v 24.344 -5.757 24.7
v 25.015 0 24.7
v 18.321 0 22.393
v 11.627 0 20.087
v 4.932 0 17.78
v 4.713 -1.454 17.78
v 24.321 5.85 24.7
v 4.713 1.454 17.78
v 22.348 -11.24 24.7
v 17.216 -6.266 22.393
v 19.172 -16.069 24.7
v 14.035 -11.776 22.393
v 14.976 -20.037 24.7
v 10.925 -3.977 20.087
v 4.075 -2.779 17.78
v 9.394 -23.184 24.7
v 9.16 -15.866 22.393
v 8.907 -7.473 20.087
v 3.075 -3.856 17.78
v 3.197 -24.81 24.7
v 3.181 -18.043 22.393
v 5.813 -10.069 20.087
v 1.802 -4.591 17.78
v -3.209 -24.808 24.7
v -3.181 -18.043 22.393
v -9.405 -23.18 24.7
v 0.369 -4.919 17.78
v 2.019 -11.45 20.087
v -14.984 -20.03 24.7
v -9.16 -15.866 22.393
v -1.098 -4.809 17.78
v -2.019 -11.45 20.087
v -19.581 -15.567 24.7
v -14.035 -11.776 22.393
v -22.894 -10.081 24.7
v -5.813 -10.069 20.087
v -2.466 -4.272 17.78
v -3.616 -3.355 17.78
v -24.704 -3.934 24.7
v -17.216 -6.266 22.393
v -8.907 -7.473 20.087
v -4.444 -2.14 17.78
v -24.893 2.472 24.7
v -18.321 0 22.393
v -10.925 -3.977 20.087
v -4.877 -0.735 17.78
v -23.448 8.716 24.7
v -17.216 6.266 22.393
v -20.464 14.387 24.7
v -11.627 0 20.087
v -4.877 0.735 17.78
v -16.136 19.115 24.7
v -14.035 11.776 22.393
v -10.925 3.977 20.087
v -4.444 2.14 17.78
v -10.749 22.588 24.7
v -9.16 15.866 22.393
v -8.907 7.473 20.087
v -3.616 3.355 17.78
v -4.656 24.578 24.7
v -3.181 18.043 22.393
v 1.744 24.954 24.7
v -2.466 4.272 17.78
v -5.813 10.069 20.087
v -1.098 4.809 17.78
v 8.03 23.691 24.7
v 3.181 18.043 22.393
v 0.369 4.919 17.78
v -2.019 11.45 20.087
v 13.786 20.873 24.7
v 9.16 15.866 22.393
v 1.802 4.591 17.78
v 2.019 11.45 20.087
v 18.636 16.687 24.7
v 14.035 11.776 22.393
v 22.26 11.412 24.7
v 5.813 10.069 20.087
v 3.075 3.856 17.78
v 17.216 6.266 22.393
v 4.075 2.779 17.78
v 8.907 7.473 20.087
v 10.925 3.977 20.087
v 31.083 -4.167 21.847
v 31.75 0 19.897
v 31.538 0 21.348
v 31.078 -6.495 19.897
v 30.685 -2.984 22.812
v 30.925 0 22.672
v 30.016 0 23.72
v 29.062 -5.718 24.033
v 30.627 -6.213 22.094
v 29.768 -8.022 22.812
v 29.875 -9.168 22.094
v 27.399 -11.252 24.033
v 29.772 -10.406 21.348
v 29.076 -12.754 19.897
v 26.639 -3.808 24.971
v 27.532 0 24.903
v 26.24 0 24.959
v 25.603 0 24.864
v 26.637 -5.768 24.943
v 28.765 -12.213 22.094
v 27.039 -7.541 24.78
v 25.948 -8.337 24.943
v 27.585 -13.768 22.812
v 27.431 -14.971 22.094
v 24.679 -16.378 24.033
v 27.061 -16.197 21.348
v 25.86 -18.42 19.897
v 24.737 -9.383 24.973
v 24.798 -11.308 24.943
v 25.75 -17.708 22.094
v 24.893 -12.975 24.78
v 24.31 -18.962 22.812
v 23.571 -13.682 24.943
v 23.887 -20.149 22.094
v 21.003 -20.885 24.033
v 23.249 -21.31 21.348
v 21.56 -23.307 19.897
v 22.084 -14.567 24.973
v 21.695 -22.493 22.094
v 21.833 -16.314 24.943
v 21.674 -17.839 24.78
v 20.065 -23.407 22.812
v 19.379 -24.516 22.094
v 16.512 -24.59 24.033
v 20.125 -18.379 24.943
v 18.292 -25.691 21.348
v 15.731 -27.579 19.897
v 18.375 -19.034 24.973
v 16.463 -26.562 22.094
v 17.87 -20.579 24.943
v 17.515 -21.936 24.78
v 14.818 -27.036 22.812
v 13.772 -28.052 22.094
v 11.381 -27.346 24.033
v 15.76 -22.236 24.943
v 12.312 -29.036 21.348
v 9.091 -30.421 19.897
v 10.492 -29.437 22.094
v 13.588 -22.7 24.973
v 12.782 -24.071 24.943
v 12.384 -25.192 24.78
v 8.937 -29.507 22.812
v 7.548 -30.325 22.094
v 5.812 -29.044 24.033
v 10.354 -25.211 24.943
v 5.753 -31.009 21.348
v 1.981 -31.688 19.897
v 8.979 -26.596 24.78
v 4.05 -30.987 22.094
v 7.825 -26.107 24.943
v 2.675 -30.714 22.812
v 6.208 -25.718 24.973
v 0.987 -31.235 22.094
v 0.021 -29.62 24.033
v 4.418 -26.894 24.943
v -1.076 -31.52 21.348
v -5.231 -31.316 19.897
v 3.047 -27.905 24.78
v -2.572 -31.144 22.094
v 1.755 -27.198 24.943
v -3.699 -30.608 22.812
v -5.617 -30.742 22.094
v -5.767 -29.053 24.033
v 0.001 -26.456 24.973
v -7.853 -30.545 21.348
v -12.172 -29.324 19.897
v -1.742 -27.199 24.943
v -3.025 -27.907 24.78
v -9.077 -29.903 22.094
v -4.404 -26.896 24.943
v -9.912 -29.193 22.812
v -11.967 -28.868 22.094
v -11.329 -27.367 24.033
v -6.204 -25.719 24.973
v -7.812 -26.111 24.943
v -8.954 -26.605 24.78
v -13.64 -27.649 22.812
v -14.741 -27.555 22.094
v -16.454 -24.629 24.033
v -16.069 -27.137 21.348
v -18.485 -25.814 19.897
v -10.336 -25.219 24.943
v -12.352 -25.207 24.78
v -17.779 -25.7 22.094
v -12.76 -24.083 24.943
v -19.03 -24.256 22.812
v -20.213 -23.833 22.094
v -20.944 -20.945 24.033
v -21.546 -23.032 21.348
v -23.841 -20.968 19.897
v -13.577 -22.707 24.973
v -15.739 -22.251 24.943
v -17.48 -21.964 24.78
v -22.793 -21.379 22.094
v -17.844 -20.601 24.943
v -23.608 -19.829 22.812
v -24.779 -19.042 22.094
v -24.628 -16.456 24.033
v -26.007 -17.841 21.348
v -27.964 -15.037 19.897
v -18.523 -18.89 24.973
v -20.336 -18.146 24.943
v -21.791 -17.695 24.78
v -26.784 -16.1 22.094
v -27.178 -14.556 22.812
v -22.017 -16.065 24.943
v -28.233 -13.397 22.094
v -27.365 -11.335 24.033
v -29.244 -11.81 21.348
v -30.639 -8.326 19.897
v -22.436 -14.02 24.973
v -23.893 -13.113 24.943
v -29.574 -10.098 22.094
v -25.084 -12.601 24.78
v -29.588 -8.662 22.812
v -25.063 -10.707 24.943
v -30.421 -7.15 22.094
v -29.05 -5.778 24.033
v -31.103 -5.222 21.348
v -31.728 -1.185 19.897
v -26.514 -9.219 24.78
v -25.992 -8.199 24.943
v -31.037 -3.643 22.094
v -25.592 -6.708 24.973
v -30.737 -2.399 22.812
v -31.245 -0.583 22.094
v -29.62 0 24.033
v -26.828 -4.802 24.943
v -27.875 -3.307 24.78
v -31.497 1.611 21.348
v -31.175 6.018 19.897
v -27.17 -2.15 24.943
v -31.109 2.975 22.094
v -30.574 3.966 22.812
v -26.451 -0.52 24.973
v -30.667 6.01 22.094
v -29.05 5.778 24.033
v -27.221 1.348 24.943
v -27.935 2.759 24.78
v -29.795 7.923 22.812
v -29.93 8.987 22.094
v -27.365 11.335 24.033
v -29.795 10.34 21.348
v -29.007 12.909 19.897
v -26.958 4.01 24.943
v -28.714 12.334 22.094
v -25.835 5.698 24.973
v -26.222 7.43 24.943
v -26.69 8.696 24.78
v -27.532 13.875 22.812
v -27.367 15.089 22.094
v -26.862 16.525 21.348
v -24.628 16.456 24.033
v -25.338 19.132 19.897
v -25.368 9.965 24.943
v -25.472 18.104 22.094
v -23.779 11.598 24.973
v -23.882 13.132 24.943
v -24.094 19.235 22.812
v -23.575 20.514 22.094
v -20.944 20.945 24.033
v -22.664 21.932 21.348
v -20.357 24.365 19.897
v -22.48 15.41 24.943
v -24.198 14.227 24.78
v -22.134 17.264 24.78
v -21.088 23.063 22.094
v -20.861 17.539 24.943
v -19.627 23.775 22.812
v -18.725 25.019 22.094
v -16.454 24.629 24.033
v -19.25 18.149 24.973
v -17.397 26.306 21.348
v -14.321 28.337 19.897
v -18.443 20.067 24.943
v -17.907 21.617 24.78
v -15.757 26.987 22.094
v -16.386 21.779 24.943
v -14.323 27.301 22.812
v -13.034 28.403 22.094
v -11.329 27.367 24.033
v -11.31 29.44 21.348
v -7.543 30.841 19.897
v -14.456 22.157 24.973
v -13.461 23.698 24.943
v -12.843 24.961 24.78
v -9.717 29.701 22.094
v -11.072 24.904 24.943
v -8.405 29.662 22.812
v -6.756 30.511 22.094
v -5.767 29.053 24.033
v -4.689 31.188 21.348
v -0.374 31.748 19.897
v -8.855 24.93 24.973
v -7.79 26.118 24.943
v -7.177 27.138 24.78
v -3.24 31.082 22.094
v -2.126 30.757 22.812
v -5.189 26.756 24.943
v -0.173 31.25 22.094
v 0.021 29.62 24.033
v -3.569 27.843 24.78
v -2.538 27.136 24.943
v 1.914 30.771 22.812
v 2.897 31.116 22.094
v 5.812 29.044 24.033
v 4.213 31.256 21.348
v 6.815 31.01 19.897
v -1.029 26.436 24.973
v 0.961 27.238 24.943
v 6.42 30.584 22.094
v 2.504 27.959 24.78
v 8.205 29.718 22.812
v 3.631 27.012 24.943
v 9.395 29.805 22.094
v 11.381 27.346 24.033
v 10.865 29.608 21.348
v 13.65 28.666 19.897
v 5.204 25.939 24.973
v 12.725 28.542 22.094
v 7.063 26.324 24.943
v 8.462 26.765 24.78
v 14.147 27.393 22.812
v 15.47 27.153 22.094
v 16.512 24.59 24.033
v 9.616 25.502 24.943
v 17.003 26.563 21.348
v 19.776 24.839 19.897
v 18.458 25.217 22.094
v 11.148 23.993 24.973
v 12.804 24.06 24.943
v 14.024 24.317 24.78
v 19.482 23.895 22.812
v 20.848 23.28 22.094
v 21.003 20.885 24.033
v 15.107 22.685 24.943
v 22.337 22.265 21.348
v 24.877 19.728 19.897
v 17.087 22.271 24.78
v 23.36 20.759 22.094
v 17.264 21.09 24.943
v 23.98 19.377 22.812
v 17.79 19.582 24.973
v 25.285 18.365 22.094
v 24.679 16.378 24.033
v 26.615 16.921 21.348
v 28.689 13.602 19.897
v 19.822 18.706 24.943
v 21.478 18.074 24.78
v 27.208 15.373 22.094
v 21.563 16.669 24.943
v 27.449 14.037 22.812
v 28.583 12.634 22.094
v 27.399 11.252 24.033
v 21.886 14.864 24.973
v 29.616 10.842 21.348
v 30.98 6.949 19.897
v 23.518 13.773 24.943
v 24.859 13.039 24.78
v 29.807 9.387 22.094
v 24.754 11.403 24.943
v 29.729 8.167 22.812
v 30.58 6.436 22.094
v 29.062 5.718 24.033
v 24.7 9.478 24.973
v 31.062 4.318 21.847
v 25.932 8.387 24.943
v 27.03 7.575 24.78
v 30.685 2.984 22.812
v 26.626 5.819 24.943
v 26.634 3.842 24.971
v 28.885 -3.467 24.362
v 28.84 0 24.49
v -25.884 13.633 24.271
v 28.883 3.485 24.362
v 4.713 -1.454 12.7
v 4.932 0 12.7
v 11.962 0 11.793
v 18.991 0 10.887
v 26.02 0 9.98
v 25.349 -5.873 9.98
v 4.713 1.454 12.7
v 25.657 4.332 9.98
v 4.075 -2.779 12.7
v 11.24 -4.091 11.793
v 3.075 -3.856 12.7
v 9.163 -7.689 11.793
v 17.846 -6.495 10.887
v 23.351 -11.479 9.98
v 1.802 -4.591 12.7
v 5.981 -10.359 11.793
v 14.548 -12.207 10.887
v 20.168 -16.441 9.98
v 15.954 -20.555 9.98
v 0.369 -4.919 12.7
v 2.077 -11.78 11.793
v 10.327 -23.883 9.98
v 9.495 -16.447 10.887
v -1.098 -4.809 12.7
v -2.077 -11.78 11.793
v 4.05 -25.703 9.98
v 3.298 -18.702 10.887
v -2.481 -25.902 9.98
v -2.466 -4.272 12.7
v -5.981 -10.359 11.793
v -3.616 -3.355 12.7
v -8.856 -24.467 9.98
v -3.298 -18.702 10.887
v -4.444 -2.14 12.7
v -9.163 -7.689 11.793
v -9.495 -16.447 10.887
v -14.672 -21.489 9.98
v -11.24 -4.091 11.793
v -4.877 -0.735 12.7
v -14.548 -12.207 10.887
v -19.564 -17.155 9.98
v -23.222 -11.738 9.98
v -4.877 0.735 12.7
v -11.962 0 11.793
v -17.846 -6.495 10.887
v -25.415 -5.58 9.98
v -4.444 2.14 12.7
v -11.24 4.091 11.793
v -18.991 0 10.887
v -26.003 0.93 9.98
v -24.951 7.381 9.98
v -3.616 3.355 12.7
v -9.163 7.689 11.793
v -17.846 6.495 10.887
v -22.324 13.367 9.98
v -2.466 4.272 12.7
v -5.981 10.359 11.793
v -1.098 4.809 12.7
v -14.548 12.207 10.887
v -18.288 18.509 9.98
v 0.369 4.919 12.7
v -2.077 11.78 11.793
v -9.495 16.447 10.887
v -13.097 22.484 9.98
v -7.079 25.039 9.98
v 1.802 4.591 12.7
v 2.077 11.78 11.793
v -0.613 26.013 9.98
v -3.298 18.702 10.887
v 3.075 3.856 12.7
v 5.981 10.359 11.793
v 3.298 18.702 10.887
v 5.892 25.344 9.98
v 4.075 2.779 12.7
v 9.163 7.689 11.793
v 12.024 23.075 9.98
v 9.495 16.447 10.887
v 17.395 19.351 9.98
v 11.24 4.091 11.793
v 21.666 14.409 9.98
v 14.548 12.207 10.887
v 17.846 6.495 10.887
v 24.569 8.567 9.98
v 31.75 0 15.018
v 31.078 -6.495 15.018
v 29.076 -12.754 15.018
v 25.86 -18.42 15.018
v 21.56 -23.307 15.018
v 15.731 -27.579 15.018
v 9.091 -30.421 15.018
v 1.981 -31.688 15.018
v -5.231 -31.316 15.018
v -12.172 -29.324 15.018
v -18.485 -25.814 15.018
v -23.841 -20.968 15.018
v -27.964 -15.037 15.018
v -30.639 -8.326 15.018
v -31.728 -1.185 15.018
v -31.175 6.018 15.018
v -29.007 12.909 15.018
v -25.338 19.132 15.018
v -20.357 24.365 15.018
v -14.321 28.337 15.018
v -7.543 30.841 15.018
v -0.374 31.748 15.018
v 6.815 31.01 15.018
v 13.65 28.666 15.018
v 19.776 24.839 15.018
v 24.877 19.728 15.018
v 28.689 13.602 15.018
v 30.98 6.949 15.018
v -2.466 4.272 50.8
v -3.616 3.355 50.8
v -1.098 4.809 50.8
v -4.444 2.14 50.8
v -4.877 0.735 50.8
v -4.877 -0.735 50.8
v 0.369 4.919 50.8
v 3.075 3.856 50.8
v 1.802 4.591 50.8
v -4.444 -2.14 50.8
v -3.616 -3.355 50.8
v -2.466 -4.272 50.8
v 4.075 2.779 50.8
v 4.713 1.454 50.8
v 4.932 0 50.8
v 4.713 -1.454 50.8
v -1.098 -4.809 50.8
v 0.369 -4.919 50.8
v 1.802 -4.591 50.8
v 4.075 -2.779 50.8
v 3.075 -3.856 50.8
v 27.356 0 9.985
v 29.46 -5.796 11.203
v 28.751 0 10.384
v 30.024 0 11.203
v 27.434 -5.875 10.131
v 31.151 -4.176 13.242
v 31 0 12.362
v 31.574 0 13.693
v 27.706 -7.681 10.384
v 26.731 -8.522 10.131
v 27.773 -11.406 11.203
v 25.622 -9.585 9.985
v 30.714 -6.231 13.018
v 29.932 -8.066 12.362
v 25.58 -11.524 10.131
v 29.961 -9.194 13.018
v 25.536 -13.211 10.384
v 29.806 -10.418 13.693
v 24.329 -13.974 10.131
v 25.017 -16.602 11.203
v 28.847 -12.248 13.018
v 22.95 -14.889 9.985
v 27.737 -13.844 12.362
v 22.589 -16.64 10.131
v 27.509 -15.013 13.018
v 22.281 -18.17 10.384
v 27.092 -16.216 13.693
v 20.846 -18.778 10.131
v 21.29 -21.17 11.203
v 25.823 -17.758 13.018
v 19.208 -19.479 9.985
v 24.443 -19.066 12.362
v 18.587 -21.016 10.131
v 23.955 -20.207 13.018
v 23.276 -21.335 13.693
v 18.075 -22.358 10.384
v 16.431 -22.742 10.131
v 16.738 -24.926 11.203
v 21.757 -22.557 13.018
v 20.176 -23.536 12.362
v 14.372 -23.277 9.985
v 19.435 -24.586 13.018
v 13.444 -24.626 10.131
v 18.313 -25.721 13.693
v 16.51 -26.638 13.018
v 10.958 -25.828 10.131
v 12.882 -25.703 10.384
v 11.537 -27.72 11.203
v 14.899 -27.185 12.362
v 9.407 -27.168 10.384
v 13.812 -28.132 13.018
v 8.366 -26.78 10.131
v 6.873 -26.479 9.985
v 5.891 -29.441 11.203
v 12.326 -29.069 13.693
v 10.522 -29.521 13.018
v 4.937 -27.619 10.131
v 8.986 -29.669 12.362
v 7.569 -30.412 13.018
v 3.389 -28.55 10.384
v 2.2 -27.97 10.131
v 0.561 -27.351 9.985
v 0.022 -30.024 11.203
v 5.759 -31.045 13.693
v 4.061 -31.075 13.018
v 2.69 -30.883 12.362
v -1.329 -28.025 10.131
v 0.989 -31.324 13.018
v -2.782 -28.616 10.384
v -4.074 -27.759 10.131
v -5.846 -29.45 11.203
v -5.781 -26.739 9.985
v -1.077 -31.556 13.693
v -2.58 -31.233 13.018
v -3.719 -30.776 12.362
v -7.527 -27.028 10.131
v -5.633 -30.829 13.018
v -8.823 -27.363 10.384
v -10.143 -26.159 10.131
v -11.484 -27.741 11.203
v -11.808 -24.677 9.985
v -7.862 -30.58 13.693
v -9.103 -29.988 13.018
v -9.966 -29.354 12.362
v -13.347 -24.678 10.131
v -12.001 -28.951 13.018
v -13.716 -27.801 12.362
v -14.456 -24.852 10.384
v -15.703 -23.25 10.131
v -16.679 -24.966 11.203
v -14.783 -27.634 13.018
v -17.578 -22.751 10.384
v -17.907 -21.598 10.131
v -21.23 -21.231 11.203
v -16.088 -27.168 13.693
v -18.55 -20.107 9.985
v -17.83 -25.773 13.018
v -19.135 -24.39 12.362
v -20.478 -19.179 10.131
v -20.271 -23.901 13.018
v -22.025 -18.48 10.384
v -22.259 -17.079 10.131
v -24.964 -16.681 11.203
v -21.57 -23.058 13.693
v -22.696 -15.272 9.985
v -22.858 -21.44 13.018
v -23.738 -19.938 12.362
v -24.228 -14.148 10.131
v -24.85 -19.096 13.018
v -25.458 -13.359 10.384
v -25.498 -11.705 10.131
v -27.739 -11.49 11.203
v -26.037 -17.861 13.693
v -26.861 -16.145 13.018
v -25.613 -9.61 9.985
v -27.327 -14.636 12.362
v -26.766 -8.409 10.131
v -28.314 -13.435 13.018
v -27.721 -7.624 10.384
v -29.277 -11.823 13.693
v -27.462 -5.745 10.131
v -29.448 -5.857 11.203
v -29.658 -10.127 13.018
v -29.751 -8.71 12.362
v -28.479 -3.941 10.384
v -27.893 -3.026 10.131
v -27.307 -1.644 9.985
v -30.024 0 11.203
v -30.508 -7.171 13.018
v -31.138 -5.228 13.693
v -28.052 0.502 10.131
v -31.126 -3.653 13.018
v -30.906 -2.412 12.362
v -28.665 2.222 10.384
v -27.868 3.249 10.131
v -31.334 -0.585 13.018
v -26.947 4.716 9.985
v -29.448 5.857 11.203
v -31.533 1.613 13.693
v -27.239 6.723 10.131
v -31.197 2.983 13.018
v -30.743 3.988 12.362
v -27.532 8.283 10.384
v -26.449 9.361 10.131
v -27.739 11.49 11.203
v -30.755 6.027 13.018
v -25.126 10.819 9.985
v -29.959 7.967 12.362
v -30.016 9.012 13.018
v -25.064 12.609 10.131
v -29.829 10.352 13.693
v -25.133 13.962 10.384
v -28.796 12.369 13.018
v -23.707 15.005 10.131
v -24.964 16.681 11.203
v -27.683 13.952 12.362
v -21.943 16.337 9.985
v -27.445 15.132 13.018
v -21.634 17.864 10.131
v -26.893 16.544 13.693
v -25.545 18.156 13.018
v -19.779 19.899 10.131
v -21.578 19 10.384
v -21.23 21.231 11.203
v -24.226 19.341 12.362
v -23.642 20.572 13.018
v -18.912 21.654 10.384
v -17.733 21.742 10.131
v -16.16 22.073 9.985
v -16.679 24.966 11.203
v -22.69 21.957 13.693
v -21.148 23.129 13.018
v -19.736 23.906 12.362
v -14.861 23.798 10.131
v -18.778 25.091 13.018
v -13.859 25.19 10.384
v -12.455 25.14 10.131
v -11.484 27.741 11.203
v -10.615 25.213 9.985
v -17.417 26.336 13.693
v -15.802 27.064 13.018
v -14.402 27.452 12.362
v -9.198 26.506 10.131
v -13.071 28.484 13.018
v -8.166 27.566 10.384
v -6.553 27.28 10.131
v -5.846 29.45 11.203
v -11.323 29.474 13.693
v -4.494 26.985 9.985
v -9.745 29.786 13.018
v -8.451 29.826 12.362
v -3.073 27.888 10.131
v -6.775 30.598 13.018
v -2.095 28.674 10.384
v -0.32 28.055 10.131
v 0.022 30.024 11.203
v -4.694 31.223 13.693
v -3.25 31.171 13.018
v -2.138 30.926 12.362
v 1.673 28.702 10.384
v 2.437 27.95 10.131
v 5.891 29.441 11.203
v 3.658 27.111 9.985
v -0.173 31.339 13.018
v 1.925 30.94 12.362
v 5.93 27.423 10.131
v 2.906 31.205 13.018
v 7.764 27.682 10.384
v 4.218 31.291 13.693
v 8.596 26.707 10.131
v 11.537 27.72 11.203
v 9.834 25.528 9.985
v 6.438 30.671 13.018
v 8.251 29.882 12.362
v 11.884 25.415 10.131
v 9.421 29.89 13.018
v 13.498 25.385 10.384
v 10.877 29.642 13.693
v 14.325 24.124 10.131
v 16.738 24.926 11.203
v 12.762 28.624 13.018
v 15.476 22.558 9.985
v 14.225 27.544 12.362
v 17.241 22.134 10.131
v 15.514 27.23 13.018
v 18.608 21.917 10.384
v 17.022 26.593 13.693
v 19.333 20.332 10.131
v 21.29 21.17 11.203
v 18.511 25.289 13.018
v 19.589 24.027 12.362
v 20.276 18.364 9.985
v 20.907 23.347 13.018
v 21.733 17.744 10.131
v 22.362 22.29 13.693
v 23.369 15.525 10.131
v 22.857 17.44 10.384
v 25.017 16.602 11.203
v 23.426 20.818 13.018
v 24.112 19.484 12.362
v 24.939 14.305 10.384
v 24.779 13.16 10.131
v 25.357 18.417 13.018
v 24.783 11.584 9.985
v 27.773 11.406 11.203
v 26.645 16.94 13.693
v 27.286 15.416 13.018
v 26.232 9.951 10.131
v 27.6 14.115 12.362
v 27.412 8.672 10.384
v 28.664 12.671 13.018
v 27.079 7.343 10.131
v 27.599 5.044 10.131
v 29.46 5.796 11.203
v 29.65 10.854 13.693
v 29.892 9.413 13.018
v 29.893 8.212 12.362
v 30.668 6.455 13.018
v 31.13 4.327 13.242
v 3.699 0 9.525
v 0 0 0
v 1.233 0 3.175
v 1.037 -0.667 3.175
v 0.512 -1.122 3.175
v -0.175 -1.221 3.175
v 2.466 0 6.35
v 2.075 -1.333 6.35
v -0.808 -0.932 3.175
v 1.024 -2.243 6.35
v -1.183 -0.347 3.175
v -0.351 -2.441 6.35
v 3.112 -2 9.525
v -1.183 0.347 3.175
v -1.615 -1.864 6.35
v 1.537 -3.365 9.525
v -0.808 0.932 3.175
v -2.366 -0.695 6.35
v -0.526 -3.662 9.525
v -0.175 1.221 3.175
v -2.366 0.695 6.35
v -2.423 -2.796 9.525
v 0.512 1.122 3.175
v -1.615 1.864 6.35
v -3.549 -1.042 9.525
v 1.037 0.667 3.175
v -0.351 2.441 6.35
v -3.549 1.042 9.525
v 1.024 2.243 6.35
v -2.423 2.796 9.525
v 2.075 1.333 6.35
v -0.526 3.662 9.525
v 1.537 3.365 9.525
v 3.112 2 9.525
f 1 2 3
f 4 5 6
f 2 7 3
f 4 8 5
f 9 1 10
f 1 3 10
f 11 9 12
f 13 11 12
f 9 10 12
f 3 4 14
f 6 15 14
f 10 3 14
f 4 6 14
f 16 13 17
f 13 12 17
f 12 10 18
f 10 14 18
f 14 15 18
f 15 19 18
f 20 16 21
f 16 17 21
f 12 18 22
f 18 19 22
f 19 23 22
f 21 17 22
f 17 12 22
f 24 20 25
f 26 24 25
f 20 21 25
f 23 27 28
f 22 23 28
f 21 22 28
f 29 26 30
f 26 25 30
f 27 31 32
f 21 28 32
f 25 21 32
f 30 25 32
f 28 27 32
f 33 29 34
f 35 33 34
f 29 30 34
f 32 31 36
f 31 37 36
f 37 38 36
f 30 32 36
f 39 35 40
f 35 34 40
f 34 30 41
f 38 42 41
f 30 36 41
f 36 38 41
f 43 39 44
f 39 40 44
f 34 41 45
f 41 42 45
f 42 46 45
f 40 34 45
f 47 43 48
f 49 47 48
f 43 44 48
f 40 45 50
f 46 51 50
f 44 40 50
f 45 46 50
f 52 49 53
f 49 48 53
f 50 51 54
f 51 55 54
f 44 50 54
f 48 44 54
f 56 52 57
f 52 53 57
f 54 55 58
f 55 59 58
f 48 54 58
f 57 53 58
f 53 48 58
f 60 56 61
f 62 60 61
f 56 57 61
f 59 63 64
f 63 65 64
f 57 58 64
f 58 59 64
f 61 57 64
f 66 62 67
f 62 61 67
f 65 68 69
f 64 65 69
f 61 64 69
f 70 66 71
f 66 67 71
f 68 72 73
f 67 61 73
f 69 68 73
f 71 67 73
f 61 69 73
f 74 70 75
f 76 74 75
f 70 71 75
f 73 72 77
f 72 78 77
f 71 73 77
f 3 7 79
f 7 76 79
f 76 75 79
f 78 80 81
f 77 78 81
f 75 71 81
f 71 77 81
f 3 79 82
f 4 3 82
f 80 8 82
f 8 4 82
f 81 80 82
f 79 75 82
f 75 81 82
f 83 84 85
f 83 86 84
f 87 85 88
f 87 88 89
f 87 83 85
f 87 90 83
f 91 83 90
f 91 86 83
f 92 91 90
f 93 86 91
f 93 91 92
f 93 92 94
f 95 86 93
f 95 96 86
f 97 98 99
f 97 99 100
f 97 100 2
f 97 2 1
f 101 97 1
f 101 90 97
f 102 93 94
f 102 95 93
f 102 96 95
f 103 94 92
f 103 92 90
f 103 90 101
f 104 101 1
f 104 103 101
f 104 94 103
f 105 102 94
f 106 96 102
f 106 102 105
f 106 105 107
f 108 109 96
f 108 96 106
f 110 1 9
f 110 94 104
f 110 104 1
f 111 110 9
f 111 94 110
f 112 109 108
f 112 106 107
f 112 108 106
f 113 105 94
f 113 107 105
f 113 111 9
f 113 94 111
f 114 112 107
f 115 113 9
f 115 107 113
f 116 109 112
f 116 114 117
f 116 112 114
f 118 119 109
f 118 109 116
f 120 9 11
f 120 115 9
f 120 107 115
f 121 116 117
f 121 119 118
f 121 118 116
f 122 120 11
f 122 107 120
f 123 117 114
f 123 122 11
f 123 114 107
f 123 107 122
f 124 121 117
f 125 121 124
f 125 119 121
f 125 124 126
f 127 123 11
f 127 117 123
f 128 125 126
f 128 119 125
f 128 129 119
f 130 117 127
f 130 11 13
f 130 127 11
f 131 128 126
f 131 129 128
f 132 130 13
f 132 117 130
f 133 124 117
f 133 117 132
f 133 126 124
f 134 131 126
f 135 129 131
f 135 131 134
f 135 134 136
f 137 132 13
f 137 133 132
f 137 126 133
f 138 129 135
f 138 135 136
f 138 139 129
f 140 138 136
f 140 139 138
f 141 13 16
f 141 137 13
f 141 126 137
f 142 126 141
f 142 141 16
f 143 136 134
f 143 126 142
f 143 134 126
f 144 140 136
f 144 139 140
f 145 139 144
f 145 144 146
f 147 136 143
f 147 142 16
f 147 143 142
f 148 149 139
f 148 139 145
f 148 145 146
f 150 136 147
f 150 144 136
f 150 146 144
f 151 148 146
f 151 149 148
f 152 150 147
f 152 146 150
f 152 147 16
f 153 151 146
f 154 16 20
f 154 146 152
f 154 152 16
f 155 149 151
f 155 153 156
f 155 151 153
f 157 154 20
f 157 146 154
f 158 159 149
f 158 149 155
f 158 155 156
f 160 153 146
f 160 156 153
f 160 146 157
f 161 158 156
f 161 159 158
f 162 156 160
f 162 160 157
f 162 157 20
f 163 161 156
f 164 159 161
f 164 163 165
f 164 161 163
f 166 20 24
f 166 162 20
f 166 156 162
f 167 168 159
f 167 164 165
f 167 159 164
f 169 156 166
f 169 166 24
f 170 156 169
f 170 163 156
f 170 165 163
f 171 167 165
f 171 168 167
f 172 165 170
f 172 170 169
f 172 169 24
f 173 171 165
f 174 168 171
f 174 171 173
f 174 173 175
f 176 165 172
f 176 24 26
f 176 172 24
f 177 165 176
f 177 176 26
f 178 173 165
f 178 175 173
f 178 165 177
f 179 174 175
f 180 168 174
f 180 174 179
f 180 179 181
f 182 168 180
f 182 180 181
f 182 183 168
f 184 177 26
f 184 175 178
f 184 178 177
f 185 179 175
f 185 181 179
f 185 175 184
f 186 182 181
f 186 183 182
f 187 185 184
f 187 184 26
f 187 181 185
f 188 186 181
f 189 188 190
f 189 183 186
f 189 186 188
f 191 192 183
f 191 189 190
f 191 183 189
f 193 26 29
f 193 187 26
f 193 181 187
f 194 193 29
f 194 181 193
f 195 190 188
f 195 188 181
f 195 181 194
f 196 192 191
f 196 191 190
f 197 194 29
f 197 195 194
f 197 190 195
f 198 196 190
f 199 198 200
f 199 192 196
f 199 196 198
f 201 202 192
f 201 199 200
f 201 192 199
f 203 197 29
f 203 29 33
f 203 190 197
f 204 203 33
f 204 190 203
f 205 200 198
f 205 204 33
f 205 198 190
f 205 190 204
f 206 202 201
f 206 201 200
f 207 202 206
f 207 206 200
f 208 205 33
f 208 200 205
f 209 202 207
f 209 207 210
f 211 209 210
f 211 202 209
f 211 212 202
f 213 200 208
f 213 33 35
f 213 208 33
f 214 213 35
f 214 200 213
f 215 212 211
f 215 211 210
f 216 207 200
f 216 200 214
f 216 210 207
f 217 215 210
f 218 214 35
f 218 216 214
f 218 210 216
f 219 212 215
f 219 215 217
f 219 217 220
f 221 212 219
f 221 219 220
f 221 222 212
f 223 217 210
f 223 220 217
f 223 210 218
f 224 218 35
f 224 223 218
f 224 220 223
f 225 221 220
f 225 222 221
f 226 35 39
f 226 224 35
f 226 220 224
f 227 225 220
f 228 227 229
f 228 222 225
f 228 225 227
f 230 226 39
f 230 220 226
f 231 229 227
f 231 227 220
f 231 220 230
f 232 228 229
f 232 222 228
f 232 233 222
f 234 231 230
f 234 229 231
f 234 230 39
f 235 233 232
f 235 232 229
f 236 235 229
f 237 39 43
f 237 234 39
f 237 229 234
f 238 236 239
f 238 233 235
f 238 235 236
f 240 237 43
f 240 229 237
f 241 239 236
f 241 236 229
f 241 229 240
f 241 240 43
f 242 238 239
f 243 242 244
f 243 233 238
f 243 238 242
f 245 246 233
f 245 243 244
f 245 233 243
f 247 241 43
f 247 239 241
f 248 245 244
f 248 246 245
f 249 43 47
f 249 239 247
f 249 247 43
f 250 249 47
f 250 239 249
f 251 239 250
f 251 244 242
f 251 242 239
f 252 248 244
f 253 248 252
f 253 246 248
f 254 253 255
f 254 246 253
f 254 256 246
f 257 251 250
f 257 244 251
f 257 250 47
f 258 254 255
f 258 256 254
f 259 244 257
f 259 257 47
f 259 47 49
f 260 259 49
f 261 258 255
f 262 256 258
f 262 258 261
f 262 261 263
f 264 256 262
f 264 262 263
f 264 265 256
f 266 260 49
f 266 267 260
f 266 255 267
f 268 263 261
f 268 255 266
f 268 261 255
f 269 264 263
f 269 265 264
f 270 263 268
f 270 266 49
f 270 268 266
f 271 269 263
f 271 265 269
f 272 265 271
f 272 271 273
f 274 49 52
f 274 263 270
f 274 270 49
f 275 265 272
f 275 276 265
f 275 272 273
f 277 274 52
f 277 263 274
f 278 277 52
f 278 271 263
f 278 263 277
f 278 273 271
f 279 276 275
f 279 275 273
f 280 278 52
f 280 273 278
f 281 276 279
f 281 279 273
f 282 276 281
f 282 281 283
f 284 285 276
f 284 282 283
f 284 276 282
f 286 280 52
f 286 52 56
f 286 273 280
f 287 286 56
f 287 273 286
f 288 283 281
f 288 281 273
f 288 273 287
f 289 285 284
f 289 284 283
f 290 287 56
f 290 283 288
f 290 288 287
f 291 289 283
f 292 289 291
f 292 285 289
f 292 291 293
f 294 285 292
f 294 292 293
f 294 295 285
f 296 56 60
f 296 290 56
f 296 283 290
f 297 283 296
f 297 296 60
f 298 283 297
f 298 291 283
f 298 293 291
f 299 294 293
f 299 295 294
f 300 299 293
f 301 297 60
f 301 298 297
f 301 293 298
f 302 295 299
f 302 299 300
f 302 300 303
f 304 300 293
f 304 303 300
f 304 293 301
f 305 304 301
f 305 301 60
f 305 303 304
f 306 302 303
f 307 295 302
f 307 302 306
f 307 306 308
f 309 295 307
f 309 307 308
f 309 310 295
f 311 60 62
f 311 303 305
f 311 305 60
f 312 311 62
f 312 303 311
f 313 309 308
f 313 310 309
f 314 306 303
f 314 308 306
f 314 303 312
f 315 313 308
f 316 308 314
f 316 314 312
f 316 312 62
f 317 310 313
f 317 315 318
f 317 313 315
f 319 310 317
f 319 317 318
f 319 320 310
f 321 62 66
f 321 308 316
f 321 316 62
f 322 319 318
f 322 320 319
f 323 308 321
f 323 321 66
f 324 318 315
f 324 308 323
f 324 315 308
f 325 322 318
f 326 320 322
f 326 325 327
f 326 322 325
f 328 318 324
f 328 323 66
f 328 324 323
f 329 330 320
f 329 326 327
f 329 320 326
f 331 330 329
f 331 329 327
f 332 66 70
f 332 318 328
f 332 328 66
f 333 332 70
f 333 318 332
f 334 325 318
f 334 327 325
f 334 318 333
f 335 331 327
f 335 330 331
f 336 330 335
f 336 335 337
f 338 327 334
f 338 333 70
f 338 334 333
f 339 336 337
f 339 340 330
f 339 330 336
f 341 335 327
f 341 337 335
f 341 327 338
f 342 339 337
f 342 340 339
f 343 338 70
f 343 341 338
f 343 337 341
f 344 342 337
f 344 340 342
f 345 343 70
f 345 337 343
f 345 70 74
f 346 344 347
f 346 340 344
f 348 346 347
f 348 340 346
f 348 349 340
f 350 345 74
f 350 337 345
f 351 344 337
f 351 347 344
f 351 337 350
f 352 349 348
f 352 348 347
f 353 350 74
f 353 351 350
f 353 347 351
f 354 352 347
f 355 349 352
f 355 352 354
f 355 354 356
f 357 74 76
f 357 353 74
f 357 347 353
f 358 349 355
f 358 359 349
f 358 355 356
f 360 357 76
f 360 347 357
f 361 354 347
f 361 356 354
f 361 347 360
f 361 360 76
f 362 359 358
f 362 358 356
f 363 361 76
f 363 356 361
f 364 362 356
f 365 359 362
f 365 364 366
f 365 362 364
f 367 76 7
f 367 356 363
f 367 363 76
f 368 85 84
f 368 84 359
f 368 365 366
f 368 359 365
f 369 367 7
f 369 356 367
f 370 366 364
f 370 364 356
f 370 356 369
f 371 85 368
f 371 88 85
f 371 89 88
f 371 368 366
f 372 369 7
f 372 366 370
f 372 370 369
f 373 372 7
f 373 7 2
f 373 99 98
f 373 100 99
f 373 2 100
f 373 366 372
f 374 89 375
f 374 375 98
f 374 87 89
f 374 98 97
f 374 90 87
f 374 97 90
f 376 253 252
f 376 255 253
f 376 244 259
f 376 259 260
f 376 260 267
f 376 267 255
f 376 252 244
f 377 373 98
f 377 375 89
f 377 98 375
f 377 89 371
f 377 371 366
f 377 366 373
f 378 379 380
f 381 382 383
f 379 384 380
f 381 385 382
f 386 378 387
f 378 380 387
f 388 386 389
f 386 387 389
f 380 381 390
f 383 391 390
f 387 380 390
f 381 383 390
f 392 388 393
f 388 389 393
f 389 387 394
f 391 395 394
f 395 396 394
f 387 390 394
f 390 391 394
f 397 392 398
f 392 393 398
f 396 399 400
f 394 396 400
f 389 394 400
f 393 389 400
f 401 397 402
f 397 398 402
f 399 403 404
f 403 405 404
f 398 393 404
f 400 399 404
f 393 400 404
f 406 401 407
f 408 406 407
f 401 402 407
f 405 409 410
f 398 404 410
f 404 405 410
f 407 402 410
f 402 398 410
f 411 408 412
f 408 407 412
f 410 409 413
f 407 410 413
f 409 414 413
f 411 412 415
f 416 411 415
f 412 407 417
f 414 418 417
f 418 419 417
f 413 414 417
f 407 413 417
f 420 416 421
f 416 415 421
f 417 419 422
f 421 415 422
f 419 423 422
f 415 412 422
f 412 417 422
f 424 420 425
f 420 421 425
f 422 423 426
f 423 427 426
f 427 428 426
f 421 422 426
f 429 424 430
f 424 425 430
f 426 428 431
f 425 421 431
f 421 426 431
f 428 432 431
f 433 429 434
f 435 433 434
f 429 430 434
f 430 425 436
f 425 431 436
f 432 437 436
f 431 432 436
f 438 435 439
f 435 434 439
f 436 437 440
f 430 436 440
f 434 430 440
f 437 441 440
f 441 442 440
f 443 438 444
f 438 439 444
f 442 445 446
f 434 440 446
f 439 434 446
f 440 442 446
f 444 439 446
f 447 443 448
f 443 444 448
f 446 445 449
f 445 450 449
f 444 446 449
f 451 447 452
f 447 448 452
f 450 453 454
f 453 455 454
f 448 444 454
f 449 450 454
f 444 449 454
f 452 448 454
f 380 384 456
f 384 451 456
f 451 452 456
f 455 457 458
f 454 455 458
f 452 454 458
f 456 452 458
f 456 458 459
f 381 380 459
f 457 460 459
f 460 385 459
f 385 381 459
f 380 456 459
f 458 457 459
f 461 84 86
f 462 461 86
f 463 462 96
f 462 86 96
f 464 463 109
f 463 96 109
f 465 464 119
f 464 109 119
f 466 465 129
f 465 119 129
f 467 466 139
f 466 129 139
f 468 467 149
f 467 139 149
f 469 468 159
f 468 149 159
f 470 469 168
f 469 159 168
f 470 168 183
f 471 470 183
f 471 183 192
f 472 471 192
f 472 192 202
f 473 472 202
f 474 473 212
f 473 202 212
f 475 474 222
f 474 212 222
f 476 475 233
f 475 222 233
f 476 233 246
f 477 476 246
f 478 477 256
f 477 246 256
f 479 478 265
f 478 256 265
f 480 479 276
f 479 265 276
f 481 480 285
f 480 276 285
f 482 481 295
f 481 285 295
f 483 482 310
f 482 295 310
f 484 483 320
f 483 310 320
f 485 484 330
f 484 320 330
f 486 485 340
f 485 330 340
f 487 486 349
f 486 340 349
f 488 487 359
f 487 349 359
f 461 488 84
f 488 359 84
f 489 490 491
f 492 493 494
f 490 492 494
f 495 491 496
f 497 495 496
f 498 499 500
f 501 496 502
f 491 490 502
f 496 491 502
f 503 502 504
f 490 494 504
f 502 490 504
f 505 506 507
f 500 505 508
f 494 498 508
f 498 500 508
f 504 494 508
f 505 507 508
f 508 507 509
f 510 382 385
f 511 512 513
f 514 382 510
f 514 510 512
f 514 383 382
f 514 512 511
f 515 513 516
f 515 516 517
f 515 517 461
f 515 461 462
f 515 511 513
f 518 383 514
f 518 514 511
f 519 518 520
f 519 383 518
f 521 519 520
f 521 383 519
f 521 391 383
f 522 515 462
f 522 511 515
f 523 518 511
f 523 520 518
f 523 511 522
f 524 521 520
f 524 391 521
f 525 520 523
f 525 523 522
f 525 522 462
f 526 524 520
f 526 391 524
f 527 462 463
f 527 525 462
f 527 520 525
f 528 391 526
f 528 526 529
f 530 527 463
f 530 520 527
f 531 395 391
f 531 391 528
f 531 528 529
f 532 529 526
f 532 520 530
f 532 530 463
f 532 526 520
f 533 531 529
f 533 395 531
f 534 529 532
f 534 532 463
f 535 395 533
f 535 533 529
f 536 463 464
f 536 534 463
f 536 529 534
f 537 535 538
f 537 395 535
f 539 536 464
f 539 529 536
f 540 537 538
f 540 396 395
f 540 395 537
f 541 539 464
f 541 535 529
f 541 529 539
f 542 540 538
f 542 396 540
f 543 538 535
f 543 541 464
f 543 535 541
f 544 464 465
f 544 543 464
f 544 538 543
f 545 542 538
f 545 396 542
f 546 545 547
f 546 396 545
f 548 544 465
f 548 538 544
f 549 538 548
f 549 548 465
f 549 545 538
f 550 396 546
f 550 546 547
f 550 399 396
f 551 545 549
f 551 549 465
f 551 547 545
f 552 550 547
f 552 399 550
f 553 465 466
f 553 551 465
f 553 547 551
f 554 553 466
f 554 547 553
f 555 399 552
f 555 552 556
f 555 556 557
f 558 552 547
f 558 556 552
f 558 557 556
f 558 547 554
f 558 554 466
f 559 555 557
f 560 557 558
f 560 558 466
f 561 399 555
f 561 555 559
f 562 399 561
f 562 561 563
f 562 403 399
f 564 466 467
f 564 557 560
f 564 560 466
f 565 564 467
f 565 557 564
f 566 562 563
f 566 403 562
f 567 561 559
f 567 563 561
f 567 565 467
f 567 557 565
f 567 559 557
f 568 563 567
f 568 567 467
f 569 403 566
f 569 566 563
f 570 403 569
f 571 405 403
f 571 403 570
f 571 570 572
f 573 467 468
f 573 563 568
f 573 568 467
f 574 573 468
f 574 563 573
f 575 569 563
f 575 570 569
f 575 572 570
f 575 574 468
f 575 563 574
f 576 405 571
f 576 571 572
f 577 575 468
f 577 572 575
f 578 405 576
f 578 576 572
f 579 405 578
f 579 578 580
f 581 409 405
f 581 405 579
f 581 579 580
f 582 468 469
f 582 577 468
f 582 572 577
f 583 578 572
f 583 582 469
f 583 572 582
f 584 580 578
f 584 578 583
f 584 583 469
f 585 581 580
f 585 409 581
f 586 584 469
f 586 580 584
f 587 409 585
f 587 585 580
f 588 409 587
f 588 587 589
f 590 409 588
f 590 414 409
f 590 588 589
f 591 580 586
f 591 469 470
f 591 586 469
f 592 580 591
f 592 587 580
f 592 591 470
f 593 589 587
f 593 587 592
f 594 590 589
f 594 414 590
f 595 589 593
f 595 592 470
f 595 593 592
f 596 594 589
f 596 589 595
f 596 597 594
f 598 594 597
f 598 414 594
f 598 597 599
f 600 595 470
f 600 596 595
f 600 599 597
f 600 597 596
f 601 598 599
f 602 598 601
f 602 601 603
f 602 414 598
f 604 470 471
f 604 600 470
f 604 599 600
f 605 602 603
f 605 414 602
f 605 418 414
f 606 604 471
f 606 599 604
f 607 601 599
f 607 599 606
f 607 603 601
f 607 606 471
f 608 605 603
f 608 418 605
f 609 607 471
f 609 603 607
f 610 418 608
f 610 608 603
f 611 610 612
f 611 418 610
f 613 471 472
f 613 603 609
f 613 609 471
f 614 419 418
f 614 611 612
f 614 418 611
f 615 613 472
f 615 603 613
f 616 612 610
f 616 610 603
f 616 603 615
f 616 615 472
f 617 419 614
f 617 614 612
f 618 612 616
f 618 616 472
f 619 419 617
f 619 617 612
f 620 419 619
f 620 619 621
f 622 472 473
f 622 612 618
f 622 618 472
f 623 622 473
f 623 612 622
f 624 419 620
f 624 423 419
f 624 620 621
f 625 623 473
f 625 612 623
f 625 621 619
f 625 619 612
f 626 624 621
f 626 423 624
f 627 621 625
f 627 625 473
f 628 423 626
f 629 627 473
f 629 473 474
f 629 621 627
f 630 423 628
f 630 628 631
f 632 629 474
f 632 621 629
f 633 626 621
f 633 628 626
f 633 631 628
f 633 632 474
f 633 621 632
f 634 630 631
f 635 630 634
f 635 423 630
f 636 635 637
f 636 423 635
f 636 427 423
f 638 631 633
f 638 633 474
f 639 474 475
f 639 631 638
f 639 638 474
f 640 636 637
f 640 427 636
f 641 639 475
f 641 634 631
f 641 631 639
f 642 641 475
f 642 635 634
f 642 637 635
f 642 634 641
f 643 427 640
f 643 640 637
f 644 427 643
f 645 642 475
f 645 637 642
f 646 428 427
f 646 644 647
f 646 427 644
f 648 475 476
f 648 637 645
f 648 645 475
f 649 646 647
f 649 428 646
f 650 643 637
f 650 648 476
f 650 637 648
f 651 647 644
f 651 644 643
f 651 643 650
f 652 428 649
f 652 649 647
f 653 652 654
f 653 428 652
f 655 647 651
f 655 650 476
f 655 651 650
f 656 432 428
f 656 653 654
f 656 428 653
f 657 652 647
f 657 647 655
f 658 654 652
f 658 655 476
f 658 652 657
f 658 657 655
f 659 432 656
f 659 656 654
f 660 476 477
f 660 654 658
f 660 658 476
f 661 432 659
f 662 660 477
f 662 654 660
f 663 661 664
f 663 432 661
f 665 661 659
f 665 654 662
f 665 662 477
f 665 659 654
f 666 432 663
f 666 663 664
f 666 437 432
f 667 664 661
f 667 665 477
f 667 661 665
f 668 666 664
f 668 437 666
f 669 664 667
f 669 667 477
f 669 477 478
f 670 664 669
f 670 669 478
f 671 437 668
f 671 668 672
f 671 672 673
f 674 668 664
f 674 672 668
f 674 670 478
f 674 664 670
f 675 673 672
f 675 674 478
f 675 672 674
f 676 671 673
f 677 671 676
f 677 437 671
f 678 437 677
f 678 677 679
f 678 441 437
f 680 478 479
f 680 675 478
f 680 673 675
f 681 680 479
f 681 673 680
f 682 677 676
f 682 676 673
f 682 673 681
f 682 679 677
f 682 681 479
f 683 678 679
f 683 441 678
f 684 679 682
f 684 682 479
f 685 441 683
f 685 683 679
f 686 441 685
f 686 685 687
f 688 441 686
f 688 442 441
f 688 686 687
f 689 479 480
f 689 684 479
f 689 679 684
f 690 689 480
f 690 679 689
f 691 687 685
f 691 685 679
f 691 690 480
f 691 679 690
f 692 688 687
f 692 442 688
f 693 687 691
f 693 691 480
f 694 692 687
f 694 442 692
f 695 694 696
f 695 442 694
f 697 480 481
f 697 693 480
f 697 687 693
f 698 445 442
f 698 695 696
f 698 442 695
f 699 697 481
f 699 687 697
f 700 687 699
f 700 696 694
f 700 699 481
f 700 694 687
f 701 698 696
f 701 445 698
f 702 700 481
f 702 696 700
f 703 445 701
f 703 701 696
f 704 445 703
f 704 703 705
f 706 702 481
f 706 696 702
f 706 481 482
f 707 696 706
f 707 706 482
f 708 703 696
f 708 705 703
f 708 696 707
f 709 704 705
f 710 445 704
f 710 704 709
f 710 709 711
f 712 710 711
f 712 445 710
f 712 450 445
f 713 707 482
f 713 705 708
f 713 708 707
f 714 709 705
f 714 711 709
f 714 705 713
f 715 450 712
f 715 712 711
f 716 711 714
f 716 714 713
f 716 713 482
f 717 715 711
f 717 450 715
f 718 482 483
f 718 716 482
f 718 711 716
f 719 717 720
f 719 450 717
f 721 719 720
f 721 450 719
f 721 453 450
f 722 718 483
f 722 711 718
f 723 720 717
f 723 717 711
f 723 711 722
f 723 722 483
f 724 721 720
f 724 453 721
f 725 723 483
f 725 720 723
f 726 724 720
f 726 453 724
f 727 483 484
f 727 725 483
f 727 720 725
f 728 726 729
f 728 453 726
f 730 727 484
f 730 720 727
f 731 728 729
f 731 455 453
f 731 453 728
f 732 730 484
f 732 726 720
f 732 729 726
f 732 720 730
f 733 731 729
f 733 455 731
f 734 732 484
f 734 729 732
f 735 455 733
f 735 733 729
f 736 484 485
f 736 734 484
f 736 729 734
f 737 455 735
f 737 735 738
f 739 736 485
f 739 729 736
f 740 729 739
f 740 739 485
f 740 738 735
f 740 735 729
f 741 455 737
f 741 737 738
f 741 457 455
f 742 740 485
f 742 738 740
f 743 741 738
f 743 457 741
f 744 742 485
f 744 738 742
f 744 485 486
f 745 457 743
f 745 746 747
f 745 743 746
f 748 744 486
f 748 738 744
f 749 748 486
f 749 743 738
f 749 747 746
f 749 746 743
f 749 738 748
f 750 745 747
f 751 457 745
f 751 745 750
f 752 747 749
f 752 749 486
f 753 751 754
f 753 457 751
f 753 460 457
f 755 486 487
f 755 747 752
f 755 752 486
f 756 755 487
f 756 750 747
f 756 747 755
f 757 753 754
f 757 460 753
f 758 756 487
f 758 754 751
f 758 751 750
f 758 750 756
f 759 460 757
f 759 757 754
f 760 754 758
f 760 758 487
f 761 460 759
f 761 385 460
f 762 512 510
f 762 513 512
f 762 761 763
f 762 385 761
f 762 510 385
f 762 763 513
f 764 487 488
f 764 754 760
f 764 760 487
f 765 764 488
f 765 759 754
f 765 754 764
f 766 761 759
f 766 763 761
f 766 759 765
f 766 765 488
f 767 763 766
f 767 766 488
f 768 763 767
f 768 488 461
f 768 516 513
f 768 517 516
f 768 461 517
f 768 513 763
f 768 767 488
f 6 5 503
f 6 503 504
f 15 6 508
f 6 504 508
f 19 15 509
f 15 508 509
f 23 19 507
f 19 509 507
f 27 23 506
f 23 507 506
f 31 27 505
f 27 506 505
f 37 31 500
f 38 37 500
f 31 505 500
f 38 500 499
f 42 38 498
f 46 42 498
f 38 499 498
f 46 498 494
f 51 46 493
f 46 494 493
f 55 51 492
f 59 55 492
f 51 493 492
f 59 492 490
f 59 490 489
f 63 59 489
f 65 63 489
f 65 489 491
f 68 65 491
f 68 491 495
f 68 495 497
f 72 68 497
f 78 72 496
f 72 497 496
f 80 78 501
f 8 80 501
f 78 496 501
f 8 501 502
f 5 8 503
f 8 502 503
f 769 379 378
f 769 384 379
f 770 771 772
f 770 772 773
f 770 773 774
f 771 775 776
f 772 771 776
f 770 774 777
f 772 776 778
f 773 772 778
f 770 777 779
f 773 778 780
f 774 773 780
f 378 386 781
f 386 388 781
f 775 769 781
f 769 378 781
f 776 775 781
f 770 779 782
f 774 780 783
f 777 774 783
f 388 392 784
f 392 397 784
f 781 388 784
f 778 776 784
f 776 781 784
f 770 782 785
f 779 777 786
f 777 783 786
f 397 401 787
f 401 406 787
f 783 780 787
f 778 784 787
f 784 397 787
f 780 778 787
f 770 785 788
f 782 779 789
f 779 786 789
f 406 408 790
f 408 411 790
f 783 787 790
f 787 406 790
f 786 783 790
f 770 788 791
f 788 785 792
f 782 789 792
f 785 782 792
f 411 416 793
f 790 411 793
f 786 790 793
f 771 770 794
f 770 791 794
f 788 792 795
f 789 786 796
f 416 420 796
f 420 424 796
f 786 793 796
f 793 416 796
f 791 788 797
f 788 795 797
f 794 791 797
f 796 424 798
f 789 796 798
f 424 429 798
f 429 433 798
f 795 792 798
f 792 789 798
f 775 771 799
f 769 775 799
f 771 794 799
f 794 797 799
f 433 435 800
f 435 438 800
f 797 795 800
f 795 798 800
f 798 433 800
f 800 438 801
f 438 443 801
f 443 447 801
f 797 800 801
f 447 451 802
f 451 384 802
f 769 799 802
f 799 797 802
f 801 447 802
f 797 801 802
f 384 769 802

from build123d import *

# Parameters (mm, degrees)
F2_R = 5.08


with BuildPart() as f1:
    # F0 (on Front) → F1 (revolve)
    with BuildSketch(Plane.XZ):
        Polygon((0, 50.8), (0, 0), (4.932402, 12.7), (31.75, 9.240629), (31.75, 27.020629), (4.932402, 17.78), (4.932402, 50.8), align=None)
    revolve(axis=Axis((0, 0, 25.4), (0, 0, -1)))

    # F2
    f2_edges = [f1.edges().sort_by_distance(p)[0] for p in [
        (-31.75, 0, 9.240629),
        (-31.75, 0, 27.020629),
        (31.75, 0, 18.130629),
    ]]
    fillet(f2_edges, radius=F2_R)


solid = f1.part
